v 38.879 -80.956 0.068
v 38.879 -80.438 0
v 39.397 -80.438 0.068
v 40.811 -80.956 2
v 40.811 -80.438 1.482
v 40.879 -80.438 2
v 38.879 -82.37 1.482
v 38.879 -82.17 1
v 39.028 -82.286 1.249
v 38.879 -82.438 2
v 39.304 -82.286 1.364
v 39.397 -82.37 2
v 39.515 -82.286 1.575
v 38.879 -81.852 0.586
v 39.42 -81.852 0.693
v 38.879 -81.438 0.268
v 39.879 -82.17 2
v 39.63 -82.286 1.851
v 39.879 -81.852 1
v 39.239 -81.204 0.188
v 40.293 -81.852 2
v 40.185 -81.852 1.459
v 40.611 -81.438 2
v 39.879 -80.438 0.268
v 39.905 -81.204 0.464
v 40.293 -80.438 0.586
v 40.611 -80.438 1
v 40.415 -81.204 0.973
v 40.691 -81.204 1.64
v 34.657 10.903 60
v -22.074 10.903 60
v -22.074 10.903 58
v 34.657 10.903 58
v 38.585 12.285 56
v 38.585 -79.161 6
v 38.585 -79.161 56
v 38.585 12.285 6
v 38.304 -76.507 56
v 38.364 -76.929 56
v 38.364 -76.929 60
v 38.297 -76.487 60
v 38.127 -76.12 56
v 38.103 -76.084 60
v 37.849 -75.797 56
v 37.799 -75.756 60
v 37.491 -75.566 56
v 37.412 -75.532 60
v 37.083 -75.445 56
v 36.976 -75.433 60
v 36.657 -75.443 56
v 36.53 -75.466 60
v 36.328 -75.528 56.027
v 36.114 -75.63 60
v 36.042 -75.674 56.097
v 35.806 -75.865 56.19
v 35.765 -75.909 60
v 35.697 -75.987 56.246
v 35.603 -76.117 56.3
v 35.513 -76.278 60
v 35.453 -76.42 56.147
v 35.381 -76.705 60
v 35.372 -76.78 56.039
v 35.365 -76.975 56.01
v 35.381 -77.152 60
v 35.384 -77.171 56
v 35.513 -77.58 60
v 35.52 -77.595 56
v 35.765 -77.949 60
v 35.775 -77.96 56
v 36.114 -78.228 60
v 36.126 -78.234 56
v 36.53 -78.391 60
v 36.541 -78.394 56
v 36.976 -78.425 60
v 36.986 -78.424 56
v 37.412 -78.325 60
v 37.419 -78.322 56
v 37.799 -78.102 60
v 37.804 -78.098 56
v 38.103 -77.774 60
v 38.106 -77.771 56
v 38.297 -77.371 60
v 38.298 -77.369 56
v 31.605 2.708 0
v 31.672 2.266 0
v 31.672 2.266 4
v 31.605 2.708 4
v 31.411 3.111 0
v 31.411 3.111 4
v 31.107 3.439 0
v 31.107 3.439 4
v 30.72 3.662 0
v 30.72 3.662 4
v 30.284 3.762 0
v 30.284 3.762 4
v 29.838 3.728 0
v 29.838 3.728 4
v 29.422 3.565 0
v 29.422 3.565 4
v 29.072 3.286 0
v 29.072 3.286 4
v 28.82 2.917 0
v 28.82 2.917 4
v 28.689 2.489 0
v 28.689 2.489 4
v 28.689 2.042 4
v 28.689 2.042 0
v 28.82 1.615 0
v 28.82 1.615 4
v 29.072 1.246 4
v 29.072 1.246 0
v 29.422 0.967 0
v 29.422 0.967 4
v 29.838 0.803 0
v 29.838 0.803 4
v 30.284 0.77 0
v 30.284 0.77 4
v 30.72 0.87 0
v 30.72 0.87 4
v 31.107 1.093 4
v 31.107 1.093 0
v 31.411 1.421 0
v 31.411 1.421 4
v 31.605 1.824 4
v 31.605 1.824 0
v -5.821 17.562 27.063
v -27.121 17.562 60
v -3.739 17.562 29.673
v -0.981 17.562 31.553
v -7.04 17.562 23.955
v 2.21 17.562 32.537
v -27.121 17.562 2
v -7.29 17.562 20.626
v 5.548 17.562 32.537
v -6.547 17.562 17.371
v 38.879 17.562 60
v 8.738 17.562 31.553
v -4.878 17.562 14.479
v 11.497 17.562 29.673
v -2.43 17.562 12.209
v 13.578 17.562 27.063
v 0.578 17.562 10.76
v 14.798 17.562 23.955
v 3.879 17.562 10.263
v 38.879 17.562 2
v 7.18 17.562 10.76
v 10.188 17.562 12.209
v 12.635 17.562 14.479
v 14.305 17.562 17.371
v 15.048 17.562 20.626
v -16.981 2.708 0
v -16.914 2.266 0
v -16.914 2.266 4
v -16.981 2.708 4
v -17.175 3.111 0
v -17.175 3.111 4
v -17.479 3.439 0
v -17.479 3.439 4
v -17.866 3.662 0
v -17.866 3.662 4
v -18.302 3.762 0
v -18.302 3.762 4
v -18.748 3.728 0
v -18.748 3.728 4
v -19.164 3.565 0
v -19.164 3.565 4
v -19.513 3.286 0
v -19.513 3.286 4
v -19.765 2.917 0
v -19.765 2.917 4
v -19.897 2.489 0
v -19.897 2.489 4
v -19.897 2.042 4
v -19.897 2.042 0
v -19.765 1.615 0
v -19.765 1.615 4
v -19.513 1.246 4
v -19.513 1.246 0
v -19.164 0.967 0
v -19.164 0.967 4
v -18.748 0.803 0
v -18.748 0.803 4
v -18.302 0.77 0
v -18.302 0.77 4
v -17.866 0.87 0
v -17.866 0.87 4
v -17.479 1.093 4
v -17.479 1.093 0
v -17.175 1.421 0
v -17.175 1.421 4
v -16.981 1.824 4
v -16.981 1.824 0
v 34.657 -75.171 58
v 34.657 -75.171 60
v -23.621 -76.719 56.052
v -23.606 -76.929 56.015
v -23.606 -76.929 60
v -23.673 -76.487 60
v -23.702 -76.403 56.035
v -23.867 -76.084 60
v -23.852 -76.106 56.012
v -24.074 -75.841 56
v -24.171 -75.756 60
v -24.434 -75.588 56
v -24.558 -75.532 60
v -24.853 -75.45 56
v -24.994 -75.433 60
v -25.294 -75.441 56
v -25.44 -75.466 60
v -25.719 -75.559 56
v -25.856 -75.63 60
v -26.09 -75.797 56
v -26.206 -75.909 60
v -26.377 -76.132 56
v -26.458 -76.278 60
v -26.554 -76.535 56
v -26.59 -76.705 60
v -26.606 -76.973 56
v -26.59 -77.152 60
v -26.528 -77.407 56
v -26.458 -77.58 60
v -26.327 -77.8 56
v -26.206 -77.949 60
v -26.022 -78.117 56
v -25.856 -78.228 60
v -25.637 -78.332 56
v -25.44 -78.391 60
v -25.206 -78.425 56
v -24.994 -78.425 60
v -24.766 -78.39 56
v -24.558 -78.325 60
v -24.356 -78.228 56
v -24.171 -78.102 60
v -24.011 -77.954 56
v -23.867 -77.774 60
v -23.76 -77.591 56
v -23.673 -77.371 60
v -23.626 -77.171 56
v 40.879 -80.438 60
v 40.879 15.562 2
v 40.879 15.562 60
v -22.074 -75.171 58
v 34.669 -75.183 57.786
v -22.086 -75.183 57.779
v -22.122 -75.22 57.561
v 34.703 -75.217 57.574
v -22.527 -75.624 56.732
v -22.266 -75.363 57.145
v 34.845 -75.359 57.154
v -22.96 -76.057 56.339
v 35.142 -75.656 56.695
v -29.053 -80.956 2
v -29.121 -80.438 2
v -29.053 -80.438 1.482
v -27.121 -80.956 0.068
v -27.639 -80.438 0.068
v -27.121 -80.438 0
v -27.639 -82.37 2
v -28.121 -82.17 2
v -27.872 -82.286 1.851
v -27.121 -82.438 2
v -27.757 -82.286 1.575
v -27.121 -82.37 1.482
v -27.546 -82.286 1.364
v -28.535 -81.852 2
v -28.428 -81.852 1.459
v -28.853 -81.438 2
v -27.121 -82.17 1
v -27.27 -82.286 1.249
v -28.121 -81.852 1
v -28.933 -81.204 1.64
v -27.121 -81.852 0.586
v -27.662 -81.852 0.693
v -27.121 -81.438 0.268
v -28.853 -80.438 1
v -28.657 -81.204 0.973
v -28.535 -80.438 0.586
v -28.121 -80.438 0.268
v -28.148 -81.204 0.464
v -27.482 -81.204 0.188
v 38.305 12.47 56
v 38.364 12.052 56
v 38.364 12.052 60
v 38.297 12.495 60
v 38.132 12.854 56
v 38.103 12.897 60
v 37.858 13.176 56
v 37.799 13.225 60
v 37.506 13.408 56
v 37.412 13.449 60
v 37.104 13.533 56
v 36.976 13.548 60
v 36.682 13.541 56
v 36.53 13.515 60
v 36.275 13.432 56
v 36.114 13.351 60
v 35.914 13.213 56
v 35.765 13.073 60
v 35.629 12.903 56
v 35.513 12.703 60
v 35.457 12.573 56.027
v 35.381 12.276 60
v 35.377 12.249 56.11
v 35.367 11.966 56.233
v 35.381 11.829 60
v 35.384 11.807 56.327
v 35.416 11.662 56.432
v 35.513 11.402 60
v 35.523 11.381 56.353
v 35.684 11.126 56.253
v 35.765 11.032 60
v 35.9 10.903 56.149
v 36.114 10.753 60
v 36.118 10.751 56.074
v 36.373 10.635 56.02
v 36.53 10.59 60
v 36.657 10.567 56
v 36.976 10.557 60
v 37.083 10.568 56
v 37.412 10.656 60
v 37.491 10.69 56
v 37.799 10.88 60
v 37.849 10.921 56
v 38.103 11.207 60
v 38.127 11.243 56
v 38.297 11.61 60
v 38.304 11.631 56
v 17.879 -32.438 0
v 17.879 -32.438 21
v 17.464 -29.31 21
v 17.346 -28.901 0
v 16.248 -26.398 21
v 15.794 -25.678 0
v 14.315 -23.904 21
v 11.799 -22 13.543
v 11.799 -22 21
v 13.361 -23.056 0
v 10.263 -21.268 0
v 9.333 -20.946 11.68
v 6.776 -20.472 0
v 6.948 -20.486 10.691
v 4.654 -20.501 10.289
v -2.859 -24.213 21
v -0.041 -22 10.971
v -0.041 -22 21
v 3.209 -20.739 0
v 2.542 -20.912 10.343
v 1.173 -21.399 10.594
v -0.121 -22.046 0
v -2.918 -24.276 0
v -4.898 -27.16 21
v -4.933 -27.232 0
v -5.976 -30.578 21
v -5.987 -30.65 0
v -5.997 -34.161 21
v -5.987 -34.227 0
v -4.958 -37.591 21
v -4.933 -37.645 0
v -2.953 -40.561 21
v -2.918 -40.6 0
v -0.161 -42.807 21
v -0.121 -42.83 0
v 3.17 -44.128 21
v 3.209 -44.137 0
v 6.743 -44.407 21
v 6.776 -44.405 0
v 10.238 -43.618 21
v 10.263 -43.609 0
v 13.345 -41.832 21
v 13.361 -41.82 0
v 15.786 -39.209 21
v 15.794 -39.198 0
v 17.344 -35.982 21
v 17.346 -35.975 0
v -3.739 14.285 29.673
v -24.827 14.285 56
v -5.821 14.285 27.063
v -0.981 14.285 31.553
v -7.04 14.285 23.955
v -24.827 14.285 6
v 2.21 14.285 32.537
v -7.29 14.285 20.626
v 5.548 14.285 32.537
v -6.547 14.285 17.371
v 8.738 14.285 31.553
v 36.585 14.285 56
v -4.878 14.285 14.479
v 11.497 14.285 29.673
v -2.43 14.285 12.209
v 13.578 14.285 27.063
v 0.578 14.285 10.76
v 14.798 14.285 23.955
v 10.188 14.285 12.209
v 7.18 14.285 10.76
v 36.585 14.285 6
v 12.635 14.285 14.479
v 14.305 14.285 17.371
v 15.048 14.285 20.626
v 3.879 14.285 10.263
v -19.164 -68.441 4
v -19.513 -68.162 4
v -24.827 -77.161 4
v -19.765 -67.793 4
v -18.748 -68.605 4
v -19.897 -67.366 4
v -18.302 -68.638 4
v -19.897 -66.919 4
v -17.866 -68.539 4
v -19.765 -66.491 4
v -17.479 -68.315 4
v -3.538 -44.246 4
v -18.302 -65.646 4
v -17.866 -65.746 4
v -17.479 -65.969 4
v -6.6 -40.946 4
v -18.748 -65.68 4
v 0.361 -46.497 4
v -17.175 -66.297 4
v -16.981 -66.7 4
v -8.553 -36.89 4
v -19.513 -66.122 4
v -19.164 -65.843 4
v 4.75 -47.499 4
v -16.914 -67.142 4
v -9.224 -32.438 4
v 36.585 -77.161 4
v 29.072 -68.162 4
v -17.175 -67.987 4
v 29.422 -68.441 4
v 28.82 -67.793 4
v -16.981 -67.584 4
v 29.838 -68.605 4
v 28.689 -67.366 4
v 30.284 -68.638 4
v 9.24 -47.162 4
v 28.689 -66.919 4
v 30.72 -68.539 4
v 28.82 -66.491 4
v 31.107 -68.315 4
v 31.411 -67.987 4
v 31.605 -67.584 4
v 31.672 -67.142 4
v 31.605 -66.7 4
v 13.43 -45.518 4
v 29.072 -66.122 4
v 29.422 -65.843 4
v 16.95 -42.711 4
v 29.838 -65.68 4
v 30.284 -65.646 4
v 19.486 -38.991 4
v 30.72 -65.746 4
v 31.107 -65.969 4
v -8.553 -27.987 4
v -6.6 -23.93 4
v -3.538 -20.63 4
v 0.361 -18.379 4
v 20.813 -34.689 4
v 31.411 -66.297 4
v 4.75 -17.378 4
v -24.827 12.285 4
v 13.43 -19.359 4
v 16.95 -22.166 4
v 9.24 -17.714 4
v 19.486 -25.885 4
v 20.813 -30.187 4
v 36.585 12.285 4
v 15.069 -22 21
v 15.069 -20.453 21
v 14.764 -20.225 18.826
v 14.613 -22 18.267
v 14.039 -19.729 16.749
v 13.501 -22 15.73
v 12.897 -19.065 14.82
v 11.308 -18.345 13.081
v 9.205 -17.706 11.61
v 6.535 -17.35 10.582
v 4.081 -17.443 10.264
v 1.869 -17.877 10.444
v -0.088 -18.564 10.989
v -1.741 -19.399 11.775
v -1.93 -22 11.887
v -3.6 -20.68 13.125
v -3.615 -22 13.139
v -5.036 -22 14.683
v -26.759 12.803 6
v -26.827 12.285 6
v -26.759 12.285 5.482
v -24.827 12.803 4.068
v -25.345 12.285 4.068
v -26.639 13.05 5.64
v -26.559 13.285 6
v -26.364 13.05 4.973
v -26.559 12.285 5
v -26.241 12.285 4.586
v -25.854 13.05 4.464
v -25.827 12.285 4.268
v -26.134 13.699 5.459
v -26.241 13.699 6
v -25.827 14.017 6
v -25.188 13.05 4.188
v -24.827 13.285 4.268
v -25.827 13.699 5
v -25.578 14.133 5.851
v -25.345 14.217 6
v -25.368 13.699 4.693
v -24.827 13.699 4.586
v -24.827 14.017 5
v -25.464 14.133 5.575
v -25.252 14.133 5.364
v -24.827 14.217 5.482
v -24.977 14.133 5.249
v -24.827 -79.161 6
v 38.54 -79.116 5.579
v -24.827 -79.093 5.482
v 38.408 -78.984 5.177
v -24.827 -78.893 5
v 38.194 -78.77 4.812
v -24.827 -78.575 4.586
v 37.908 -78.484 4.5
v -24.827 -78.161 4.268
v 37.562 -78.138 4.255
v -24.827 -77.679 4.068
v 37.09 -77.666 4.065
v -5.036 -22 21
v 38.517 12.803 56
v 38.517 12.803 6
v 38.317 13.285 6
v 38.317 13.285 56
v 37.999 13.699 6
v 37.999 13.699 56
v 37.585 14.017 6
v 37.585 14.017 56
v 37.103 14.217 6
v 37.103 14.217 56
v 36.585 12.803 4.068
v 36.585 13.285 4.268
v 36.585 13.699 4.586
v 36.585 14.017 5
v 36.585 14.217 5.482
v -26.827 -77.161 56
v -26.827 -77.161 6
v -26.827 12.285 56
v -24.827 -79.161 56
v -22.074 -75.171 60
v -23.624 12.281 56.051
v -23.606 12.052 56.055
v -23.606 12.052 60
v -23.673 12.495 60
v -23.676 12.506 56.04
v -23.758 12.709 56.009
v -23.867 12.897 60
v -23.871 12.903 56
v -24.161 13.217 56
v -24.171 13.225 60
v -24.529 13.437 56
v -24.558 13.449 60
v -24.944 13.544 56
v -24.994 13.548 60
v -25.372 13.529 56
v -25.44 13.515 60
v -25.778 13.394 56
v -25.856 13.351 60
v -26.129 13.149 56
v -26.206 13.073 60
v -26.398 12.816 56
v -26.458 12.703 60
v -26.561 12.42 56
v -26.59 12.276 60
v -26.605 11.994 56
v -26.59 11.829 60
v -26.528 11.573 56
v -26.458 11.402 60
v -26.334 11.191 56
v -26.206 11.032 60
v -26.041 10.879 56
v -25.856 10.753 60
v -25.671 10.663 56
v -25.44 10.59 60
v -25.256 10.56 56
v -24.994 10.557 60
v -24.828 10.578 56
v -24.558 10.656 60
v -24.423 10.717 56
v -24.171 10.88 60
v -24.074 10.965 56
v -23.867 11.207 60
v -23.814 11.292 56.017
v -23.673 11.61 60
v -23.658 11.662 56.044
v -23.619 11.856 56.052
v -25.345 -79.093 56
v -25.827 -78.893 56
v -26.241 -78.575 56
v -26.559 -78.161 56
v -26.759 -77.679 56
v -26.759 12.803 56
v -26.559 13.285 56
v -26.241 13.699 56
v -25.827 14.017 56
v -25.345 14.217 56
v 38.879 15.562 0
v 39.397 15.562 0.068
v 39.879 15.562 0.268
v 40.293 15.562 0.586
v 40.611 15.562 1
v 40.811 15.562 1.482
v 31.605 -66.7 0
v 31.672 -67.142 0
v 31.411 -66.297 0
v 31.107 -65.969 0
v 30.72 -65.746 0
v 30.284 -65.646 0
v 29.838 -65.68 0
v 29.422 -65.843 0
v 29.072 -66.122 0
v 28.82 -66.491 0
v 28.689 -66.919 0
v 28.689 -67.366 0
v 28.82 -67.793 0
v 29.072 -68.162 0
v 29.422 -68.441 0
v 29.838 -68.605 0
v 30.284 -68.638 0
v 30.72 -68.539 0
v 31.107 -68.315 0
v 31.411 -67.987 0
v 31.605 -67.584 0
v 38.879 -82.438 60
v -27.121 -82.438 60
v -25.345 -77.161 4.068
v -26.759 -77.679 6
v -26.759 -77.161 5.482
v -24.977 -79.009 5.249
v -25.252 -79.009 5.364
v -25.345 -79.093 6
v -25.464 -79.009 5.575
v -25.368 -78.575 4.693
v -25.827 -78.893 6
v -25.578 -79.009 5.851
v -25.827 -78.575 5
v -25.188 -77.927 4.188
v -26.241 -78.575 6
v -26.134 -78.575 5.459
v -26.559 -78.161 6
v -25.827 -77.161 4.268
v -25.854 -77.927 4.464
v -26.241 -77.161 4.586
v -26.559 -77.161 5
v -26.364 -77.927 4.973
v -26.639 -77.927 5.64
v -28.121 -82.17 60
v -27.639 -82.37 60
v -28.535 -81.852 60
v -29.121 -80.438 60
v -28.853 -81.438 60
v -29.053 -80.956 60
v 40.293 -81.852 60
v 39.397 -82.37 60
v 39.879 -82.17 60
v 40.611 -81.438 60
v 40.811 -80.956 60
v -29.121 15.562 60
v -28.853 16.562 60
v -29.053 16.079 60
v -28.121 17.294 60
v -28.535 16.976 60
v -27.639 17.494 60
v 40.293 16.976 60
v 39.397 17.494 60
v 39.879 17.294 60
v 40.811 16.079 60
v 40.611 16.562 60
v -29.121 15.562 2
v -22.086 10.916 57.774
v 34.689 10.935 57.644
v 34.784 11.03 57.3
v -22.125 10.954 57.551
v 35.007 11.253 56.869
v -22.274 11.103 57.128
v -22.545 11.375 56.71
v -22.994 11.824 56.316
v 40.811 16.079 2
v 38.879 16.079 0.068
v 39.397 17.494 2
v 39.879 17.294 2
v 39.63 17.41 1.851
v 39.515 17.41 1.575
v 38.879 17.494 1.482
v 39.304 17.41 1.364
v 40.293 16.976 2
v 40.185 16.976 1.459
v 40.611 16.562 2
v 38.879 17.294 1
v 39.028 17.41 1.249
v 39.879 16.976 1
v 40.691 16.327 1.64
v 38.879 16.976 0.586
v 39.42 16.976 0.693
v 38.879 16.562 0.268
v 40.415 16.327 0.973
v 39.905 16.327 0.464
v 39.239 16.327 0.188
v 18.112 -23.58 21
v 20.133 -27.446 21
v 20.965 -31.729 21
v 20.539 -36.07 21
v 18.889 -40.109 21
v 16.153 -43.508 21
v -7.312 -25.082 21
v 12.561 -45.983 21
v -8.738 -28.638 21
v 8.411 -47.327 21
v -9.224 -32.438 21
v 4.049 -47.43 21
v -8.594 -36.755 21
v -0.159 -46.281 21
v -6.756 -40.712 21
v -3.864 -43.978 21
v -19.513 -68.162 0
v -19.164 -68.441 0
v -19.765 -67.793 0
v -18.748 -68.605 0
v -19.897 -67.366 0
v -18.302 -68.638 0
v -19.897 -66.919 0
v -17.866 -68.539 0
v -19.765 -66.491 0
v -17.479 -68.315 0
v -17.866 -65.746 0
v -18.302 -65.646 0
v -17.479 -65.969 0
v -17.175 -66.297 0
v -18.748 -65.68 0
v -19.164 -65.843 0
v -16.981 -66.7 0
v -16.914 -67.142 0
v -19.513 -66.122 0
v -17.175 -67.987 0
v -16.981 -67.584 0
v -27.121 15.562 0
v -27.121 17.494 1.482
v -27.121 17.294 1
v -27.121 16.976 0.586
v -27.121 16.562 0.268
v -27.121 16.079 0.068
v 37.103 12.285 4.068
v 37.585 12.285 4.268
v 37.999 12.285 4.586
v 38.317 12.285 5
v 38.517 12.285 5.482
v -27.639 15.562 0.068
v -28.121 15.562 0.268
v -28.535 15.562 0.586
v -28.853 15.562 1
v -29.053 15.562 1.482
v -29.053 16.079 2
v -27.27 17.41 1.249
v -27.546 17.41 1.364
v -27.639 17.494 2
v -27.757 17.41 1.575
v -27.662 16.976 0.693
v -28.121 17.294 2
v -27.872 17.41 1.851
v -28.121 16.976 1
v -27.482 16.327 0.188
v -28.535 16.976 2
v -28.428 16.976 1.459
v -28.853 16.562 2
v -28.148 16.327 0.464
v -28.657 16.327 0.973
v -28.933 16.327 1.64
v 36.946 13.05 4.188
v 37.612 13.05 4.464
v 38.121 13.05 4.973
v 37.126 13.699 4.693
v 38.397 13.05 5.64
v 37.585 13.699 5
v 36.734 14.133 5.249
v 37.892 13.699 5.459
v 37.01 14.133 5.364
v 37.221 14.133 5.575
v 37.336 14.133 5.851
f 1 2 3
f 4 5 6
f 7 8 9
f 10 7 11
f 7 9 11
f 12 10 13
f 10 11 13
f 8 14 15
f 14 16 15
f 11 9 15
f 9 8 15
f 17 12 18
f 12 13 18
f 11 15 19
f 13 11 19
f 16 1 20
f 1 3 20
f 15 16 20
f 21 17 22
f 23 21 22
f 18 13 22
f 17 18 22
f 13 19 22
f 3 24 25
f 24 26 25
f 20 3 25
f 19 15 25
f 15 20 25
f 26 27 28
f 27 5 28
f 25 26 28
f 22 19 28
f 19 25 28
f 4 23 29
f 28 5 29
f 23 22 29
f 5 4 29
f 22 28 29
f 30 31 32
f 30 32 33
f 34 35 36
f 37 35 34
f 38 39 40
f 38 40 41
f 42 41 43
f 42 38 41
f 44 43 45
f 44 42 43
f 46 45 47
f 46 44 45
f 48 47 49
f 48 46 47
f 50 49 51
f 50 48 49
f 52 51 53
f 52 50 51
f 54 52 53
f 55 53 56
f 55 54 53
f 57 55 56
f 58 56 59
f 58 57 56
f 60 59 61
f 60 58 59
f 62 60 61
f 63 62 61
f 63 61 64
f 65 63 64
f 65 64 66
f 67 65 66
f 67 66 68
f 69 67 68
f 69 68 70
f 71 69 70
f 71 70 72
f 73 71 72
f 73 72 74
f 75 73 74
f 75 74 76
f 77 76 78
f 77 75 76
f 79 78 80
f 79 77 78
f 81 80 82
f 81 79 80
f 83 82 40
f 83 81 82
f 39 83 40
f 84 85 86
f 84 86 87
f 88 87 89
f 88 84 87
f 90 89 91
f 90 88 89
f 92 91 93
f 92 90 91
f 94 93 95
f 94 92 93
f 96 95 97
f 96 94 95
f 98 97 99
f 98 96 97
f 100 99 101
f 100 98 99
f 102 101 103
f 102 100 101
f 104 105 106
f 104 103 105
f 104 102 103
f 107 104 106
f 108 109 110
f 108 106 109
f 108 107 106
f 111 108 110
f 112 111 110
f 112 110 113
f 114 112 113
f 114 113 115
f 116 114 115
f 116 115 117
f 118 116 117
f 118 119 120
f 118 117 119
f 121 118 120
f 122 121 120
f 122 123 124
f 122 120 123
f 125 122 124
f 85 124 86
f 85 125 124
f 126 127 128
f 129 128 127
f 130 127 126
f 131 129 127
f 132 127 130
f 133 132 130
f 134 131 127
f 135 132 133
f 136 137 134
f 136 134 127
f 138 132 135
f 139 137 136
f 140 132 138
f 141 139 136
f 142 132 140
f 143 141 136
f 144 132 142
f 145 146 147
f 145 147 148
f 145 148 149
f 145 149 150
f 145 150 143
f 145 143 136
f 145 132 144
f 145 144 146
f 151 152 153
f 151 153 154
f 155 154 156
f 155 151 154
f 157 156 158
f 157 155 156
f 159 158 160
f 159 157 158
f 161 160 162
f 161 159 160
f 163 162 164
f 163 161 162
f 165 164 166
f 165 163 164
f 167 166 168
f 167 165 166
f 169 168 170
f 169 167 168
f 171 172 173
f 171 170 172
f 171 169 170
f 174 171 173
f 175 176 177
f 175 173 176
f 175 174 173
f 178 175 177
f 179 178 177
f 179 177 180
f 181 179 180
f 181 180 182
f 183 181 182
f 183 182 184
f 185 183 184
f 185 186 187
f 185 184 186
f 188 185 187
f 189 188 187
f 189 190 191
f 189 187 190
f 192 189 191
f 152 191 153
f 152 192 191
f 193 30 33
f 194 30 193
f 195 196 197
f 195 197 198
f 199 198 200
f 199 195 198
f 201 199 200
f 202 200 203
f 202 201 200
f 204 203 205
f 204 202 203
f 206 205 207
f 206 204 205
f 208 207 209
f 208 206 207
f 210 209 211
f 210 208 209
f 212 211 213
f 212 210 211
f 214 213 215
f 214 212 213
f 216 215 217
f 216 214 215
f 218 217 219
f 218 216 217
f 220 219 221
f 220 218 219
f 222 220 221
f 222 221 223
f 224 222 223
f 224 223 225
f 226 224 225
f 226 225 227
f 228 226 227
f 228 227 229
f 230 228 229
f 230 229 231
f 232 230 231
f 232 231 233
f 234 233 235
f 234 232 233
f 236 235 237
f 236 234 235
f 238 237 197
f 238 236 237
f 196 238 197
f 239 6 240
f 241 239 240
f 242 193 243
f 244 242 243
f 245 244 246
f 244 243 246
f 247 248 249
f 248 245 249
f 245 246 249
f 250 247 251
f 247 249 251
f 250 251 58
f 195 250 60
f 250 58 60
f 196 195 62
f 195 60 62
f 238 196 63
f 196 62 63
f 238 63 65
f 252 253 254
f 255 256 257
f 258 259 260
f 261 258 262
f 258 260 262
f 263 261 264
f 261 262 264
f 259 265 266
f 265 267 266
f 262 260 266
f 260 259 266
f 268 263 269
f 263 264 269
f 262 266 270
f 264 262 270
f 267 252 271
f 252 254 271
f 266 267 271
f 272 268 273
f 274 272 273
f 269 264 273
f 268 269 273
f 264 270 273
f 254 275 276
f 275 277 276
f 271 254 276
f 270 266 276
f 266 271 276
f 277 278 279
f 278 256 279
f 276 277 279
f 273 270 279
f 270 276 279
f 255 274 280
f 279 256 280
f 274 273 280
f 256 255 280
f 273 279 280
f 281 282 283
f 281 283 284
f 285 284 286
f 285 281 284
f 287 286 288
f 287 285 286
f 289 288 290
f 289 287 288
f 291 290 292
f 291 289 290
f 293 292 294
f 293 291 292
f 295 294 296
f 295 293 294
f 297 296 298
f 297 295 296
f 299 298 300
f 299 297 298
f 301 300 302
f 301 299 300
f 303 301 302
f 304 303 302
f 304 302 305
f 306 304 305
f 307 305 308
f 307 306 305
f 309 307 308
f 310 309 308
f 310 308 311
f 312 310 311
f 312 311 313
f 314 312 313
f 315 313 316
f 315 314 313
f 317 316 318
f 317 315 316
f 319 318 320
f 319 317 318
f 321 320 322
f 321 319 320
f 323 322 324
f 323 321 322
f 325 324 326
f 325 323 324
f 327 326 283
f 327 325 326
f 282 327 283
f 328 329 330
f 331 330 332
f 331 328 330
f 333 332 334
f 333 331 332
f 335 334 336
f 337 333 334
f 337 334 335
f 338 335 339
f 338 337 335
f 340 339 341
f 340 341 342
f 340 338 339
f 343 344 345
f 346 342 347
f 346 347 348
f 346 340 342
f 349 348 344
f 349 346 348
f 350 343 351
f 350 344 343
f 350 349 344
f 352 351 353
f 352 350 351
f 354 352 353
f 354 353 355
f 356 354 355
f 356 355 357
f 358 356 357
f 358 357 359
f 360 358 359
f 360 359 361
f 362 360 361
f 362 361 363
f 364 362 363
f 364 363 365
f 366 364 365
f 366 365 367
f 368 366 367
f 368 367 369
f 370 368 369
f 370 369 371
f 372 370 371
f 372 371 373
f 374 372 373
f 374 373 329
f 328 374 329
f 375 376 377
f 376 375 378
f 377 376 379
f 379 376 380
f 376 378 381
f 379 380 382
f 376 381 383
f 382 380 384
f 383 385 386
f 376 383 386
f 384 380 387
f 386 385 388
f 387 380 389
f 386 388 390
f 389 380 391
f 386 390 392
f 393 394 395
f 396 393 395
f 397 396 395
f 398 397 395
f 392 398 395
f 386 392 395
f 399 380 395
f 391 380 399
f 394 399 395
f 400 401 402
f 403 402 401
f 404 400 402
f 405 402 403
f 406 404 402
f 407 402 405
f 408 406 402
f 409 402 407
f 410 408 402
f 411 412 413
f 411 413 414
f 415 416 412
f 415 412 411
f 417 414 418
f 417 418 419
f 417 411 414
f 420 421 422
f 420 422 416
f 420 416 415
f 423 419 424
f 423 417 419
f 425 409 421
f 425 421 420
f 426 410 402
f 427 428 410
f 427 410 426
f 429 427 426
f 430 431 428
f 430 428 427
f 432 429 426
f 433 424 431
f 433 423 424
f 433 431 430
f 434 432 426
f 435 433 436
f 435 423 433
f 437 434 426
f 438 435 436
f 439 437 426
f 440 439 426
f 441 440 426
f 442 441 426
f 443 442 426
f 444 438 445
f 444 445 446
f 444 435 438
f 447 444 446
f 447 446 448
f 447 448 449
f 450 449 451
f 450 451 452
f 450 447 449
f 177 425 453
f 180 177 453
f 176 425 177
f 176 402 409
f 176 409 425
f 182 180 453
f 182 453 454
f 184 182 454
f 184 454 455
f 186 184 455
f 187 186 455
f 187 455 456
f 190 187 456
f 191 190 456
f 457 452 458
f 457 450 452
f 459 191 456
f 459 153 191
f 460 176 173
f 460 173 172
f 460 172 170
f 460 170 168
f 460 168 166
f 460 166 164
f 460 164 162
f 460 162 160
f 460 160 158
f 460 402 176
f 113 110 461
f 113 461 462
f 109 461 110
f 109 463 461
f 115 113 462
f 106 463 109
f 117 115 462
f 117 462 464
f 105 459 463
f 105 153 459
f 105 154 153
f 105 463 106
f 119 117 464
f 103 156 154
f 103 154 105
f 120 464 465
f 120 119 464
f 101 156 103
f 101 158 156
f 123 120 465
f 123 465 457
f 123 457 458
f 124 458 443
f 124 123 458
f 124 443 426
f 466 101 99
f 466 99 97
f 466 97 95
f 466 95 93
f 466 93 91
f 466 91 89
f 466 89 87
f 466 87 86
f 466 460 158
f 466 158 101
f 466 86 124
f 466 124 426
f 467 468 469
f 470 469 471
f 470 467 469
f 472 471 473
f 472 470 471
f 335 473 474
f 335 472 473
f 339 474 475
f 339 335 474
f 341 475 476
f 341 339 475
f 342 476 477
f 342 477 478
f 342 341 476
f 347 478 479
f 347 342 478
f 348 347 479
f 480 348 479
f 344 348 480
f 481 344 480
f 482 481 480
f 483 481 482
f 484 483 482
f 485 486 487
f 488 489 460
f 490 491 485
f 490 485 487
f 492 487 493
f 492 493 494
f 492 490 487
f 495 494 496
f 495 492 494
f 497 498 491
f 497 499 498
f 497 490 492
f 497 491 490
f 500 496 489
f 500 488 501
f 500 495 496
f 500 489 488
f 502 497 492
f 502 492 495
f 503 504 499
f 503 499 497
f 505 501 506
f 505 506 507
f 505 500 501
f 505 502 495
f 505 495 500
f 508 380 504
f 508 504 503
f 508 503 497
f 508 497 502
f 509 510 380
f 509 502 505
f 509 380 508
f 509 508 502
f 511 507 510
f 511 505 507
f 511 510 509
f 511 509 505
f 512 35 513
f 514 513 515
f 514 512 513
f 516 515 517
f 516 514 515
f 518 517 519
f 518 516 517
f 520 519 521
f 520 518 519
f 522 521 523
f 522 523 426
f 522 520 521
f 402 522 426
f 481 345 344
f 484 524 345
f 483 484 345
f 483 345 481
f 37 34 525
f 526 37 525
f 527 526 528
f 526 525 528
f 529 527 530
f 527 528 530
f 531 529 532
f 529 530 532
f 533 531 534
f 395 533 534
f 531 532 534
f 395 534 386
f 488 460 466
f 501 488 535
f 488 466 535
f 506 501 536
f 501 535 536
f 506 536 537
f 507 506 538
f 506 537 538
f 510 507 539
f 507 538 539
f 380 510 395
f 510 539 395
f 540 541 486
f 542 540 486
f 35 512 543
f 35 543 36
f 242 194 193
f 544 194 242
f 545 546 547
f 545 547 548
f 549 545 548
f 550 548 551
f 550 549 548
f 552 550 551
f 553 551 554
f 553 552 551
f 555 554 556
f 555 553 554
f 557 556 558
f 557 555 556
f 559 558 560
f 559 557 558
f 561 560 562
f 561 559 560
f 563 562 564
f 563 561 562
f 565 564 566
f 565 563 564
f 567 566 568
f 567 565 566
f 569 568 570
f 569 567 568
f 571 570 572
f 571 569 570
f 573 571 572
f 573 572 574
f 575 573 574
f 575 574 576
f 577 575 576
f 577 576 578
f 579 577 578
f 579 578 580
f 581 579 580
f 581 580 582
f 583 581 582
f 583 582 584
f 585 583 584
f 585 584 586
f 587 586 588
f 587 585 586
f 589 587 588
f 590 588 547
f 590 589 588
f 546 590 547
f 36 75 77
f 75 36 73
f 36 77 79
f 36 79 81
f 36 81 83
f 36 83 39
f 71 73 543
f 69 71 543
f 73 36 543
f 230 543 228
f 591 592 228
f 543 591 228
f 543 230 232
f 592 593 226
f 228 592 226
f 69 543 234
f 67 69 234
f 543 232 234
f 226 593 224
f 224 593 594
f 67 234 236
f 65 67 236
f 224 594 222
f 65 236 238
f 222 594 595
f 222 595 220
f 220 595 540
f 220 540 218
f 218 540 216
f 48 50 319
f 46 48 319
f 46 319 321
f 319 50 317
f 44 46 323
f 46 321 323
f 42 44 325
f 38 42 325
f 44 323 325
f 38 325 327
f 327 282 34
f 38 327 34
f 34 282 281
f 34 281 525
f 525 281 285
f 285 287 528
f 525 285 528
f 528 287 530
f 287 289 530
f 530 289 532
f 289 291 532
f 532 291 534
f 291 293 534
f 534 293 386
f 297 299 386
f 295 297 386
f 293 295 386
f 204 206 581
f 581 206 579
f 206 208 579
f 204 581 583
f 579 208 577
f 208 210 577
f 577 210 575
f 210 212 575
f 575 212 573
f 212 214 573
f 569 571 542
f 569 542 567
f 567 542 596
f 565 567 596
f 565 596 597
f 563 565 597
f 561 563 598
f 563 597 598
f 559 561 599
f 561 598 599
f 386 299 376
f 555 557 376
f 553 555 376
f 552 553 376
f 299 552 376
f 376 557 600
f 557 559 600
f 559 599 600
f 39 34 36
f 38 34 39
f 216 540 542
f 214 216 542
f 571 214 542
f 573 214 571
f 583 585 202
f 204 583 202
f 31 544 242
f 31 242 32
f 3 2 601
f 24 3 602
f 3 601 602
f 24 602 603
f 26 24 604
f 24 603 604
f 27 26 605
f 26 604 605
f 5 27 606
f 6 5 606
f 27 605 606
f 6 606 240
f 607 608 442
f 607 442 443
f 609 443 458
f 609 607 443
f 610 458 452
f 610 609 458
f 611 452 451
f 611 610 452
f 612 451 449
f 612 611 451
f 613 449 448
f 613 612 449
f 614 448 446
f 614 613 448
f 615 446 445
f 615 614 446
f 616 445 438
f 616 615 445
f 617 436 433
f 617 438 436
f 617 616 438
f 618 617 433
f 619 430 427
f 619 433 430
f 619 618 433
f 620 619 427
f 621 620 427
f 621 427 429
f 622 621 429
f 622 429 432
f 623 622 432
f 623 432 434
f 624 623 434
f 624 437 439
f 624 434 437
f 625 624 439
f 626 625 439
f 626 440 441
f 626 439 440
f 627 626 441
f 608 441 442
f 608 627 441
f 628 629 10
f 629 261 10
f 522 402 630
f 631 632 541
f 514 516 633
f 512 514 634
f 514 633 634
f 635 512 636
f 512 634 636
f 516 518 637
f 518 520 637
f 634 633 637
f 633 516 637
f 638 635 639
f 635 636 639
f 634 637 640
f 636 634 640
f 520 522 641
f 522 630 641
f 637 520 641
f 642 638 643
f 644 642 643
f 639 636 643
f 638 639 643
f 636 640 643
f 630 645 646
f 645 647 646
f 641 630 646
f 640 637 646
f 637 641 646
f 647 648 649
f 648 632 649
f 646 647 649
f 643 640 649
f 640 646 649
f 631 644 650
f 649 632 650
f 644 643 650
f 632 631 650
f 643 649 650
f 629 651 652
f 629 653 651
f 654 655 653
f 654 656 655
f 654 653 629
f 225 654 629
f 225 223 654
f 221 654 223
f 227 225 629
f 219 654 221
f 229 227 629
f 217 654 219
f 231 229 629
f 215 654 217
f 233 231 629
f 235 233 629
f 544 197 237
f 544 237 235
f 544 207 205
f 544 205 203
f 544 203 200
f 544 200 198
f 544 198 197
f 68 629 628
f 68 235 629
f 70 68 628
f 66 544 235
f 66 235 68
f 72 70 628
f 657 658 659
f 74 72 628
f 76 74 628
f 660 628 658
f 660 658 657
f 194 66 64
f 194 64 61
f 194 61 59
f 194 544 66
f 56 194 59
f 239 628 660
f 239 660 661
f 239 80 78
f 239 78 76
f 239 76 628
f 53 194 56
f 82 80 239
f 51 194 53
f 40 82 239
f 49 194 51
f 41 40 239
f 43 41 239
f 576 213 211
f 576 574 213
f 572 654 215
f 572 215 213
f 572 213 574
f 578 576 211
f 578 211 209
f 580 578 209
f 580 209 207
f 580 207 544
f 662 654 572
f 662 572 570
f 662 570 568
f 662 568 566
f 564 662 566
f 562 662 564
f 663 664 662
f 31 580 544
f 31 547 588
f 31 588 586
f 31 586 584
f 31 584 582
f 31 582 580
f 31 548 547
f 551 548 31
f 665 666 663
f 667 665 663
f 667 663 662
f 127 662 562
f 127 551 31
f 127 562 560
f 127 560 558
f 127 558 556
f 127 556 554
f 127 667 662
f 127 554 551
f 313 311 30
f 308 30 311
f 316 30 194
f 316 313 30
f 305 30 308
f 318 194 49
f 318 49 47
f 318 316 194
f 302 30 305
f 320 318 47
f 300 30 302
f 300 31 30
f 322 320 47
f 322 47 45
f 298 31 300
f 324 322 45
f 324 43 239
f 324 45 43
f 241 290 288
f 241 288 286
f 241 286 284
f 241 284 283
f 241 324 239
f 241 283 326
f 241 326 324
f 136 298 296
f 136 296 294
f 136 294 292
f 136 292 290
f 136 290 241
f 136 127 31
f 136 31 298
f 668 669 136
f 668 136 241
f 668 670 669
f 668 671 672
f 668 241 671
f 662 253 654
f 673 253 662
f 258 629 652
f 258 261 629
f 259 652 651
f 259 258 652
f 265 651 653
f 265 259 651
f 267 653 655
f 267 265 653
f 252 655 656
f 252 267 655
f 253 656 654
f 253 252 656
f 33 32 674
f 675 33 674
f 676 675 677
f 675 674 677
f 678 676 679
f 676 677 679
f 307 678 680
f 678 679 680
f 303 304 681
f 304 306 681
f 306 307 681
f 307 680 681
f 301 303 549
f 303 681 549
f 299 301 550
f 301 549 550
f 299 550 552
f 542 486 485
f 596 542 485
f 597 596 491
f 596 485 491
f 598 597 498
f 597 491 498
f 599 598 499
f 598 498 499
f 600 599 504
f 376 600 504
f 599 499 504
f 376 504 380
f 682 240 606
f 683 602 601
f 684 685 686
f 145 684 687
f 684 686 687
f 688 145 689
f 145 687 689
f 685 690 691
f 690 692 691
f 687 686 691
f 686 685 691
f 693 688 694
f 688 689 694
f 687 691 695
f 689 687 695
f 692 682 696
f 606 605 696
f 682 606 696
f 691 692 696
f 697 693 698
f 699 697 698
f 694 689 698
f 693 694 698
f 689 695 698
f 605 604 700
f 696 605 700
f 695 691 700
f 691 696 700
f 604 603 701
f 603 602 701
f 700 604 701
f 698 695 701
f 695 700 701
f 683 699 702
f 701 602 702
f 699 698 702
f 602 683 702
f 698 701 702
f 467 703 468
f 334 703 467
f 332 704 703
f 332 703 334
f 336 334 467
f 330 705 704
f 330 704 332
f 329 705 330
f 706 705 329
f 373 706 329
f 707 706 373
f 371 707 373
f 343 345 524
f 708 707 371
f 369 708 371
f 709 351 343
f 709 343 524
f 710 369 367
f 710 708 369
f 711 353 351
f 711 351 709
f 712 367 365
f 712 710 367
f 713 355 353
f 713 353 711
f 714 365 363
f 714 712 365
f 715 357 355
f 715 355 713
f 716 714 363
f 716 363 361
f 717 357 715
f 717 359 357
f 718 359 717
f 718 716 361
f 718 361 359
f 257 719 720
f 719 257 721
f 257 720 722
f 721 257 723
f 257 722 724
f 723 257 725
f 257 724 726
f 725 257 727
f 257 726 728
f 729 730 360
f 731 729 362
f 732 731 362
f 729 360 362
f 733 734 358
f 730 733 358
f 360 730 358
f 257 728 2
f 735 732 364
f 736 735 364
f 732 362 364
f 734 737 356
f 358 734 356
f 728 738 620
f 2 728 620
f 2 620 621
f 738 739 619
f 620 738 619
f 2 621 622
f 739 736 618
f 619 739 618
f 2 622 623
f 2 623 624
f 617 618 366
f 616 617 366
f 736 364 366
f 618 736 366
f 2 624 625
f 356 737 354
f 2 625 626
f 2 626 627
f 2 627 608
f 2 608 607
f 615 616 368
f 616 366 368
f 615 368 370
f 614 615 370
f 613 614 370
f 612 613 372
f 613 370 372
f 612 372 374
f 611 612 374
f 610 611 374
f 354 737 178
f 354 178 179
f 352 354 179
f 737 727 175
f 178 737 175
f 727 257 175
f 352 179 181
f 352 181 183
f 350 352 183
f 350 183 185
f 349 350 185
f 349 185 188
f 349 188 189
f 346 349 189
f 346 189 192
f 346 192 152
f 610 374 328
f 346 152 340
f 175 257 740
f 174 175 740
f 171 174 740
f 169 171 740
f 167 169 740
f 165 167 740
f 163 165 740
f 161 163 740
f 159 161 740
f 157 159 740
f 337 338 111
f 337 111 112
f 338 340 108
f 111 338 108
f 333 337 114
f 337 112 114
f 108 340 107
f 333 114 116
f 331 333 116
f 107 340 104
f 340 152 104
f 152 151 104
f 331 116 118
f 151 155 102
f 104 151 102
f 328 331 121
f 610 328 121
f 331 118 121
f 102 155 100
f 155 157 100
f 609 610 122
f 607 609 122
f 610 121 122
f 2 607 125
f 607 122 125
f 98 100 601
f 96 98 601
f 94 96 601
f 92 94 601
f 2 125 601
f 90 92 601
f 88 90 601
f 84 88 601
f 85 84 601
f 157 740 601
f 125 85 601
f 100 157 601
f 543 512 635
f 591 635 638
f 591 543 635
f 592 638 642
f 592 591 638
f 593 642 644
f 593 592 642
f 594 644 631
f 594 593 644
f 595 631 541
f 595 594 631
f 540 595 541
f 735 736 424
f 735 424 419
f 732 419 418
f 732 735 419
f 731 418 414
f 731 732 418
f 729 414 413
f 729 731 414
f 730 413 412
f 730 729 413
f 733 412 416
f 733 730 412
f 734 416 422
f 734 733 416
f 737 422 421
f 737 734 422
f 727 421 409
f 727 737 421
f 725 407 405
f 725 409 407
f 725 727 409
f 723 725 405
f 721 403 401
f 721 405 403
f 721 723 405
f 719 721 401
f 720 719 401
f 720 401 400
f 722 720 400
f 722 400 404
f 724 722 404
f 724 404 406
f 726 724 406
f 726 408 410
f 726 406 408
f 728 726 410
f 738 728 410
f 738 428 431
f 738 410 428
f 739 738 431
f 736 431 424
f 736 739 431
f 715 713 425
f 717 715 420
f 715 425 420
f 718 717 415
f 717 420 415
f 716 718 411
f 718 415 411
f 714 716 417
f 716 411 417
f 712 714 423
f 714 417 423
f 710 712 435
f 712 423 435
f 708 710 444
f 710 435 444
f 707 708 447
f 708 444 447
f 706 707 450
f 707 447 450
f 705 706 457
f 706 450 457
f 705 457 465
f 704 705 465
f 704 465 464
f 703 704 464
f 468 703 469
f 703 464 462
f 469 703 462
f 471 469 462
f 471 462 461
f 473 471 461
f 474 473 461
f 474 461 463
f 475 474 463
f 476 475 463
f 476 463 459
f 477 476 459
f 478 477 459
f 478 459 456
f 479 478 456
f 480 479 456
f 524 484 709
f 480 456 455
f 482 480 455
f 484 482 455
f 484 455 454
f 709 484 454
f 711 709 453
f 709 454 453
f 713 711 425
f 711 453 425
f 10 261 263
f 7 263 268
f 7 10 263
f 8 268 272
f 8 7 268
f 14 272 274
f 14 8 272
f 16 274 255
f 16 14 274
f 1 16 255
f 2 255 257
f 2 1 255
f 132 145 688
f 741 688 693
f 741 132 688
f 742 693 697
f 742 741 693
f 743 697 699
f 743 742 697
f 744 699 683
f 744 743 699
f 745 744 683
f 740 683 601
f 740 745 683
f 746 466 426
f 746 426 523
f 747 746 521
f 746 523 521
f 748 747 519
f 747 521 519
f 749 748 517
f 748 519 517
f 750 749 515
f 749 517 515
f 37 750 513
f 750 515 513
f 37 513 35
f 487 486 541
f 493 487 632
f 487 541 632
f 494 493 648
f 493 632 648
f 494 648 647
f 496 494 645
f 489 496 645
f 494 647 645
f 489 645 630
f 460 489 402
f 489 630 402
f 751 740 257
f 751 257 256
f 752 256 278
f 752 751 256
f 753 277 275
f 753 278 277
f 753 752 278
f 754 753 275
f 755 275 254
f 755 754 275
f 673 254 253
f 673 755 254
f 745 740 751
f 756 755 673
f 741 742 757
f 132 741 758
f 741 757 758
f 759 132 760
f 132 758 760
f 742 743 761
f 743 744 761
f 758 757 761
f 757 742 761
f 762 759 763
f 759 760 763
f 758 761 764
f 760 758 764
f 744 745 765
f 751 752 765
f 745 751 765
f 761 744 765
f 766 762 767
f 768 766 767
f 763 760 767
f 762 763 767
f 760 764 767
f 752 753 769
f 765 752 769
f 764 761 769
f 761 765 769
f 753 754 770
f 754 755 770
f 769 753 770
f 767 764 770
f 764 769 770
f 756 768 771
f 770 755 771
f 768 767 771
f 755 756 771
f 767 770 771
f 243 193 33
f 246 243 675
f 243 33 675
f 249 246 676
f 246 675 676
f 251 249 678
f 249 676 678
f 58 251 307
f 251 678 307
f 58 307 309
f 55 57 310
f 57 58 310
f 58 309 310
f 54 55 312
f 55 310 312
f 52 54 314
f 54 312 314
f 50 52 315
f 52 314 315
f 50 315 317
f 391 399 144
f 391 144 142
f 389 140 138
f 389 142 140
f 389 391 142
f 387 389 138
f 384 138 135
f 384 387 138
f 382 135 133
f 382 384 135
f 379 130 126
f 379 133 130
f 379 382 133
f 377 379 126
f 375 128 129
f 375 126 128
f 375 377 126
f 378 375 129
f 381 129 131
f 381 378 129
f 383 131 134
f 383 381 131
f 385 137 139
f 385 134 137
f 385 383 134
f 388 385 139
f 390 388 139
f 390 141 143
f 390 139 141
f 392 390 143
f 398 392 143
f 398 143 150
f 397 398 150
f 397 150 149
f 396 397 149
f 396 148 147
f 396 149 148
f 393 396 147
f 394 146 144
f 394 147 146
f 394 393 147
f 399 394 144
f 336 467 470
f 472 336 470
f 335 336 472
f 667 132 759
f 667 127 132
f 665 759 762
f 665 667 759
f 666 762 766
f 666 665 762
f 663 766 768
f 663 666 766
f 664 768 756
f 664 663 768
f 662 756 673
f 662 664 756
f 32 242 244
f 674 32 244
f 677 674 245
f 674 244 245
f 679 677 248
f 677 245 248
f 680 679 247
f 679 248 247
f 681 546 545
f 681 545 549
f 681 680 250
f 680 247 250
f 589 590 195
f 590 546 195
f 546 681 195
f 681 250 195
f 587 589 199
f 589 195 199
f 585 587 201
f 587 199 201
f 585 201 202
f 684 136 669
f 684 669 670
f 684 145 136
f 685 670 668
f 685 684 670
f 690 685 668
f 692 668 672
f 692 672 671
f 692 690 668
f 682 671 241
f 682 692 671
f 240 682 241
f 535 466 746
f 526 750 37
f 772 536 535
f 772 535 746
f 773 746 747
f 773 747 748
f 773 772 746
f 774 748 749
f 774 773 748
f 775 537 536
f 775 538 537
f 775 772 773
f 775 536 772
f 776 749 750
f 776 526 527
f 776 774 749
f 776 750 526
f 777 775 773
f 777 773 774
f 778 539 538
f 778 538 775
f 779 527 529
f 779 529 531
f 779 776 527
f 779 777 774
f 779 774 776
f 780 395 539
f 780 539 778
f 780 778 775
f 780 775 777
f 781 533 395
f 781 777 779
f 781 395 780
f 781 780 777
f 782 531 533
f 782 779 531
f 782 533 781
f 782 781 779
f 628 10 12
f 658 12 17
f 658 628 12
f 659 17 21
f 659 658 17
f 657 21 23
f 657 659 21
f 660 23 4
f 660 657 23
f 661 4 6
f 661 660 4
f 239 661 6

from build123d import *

# Parameters (mm, degrees)
ESBO_O1_W                   = 70
ESBO_O1_H                   = 100
ESBO_O1_R                   = 12
RESSALTO_EXTRUS_O1_DEPTH    = 4
ESBO_O2_R                   = 15.102889219
ESBO_O2_R_2                 = 12
RESSALTO_EXTRUS_O2_DEPTH    = 21
ESBO_O3_W                   = 70
ESBO_O3_H                   = 100
ESBO_O3_W_2                 = 65.412301245
ESBO_O3_H_2                 = 93.446144636
RESSALTO_EXTRUS_O3_DEPTH    = 60
FILETE1_R                   = 2
FILETE2_R                   = 2
FILETE3_R                   = 2
FILETE4_R                   = 2
FILETE5_R                   = 2
CORTE_EXTRUS_O1_DEPTH       = 17
CORTE_EXTRUS_O1_DEPTH_BACK  = 14
ESBO_O4_R                   = 1.5
FILETE6_R                   = 2
FILETE7_R                   = 2
RESSALTO_EXTRUS_O4_DEPTH    = 4
CORTE_EXTRUS_O2_DEPTH       = 4
CORTE_EXTRUS_O2_DEPTH_BACK  = 14
ESBO_O5_R                   = 1.5
FILETE8_R                   = 2
CORTE_EXTRUS_O10_DEPTH      = 32
CORTE_EXTRUS_O10_DEPTH_BACK = 22
ESBO_O6_R                   = 11.2


with BuildPart() as part:
    # Esboço1 → Ressalto-extrusão1 (new body)
    with BuildSketch(Plane.XY):
        with Locations((5.878926005, -32.438162544)):
            Rectangle(ESBO_O1_W, ESBO_O1_H)
        with Locations((5.878926005, -32.438162544)):
            Circle(ESBO_O1_R, mode=Mode.SUBTRACT)
    extrude(amount=RESSALTO_EXTRUS_O1_DEPTH)

    # Esboço2 → Ressalto-extrusão2 (add)
    with BuildSketch(Plane.XY):
        with Locations(Location((5.878926005, -32.438162544, 0), (0, 0, 180))):
            Circle(ESBO_O2_R)
        with Locations((5.878926005, -32.438162544)):
            Circle(ESBO_O2_R_2, mode=Mode.SUBTRACT)
    extrude(amount=RESSALTO_EXTRUS_O2_DEPTH)

    # Esboço3 → Ressalto-extrusão3 (add)
    with BuildSketch(Plane.XY):
        with Locations((5.878926005, -32.438162544)):
            Rectangle(ESBO_O3_W, ESBO_O3_H)
        with Locations((5.878926006, -32.438162544)):
            Rectangle(ESBO_O3_W_2, ESBO_O3_H_2, mode=Mode.SUBTRACT)
    extrude(amount=RESSALTO_EXTRUS_O3_DEPTH)

    # Filete1
    filete1_edges = [part.edges().sort_by_distance(p)[0] for p in [
        (-29.121073995, -32.438162544, 0),
    ]]
    fillet(filete1_edges, radius=FILETE1_R)

    # Filete2
    filete2_edges = [part.edges().sort_by_distance(p)[0] for p in [
        (40.878926005, -32.438162544, 0),
    ]]
    fillet(filete2_edges, radius=FILETE2_R)

    # Filete3
    filete3_edges = [part.edges().sort_by_distance(p)[0] for p in [
        (-26.827224617, -32.438162544, 4),
    ]]
    fillet(filete3_edges, radius=FILETE3_R)

    # Filete4
    filete4_edges = [part.edges().sort_by_distance(p)[0] for p in [
        (-26.827224617, -79.161234862, 33),
        (6.878926005, -79.161234862, 4),
        (38.585076628, -32.438162544, 4),
        (-26.24143818, -79.161234862, 4.585786438),
    ]]
    fillet(filete4_edges, radius=FILETE4_R)

    # Filete5
    filete5_edges = [part.edges().sort_by_distance(p)[0] for p in [
        (38.585076628, 14.284909774, 33),
        (-26.827224617, 14.284909774, 33),
        (5.878926005, 14.284909774, 4),
        (-26.24143818, 14.284909774, 4.585786438),
        (37.99929019, 14.284909774, 4.585786438),
    ]]
    fillet(filete5_edges, radius=FILETE5_R)

    # Esboço4 → Corte-extrusão1 (cut, two sides: drawn at the far end of the back side and taken through both)
    with BuildSketch(Plane.XY.offset(-CORTE_EXTRUS_O1_DEPTH_BACK)):
        with Locations((-18.413897623, 2.265871211)):
            Circle(ESBO_O4_R)
        with Locations((30.171749634, 2.265871211)):
            Circle(ESBO_O4_R)
        with Locations((30.171749634, -67.142196299)):
            Circle(ESBO_O4_R)
        with Locations((-18.413897623, -67.142196299)):
            Circle(ESBO_O4_R)
    extrude(amount=CORTE_EXTRUS_O1_DEPTH + CORTE_EXTRUS_O1_DEPTH_BACK, mode=Mode.SUBTRACT)

    # Filete6
    filete6_edges = [part.edges().sort_by_distance(p)[0] for p in [
        (-28.535287557, 17.561837456, 0.585786438),
        (5.878926005, 17.561837456, 0),
        (40.293139568, 17.561837456, 0.585786438),
        (-29.121073995, 17.561837456, 31),
        (40.878926005, 17.561837456, 31),
    ]]
    fillet(filete6_edges, radius=FILETE6_R)

    # Filete7
    filete7_edges = [part.edges().sort_by_distance(p)[0] for p in [
        (5.878926005, -82.438162544, 0),
        (-28.535287557, -82.438162544, 0.585786438),
        (40.293139568, -82.438162544, 0.585786438),
        (40.878926005, -82.438162544, 31),
        (-29.121073995, -82.438162544, 31),
    ]]
    fillet(filete7_edges, radius=FILETE7_R)

    # 3DSketch1 → Ressalto-extrusão4 (add)
    with BuildSketch(Plane(origin=(-26.827224617, -78.648847783, 60), x_dir=(0.5739296342961376, 0.81890461891279, 0), z_dir=(0, 0, 1))):
        Polygon((0, 0), (-1.957959753, -1.372236887), (36.074200136, -55.637968328), (115.460568304, 0), (77.428408415, 54.265731441), (77.149565293, 54.070304126), (75.833057159, 55.948747976), (-1.316508134, 1.87844385), align=None)
        Polygon((76.062739818, 47.503741973), (108.622178683, 1.046696924), (38.135627574, -48.353831008), (5.57618871, -1.896785959), align=None, mode=Mode.SUBTRACT)
    extrude(amount=-RESSALTO_EXTRUS_O4_DEPTH)

    # Esboço5 → Corte-extrusão2 (cut, two sides: drawn at the far end of the back side and taken through both)
    with BuildSketch(Plane.XY.offset(60).offset(-CORTE_EXTRUS_O2_DEPTH_BACK)):
        with Locations((-25.106275155, 12.052447262)):
            Circle(ESBO_O5_R)
        with Locations((36.864127165, -76.928772351)):
            Circle(ESBO_O5_R)
        with Locations((36.864127165, 12.052447262)):
            Circle(ESBO_O5_R)
        with Locations((-25.106275155, -76.928772351)):
            Circle(ESBO_O5_R)
    extrude(amount=CORTE_EXTRUS_O2_DEPTH + CORTE_EXTRUS_O2_DEPTH_BACK, mode=Mode.SUBTRACT)

    # Filete8
    # the kernel refuses this fillet: 2 mm, written as the material it takes off along each edge
    with BuildSketch(Plane(origin=(-22.073597887, 10.90308644, 56), x_dir=(0, 0, 1), z_dir=(1, 0, 0)), Plane(origin=(34.657117725, -75.171102764, 56), x_dir=(0, 0, 1), z_dir=(-1, 0, 0))) as filete8_piece_1:
        with BuildLine():
            CenterArc((FILETE8_R, -FILETE8_R), FILETE8_R, 90, 90)
            Line((0, -FILETE8_R), (-FILETE8_R * 0.02, -FILETE8_R))
            Line((-FILETE8_R * 0.02, -FILETE8_R), (-FILETE8_R * 0.02, FILETE8_R * 0.02))
            Line((-FILETE8_R * 0.02, FILETE8_R * 0.02), (FILETE8_R, FILETE8_R * 0.02))
            Line((FILETE8_R, FILETE8_R * 0.02), (FILETE8_R, 0))
        make_face()
    extrude(amount=56.730715612, mode=Mode.SUBTRACT)
    with BuildSketch(Plane(origin=(-22.073597887, -75.171102764, 56), x_dir=(0, 0, 1), z_dir=(0, 1, 0)), Plane(origin=(34.657117725, 10.90308644, 56), x_dir=(0, 0, 1), z_dir=(0, -1, 0))) as filete8_piece_2:
        with BuildLine():
            CenterArc((FILETE8_R, -FILETE8_R), FILETE8_R, 90, 90)
            Line((0, -FILETE8_R), (-FILETE8_R * 0.02, -FILETE8_R))
            Line((-FILETE8_R * 0.02, -FILETE8_R), (-FILETE8_R * 0.02, FILETE8_R * 0.02))
            Line((-FILETE8_R * 0.02, FILETE8_R * 0.02), (FILETE8_R, FILETE8_R * 0.02))
            Line((FILETE8_R, FILETE8_R * 0.02), (FILETE8_R, 0))
        make_face()
    extrude(amount=86.074189204, mode=Mode.SUBTRACT)
    with BuildSketch(Plane(origin=(-27.073597887, 10.90308644, 56), x_dir=(0, 0, 1), z_dir=(1, 0, 0))) as filete8_piece_3a_section:
        with BuildLine():
            CenterArc((FILETE8_R, -FILETE8_R), FILETE8_R, 90, 90)
            Line((0, -FILETE8_R), (-FILETE8_R * 0.02, -FILETE8_R))
            Line((-FILETE8_R * 0.02, -FILETE8_R), (-FILETE8_R * 0.02, FILETE8_R * 0.02))
            Line((-FILETE8_R * 0.02, FILETE8_R * 0.02), (FILETE8_R, FILETE8_R * 0.02))
            Line((FILETE8_R, FILETE8_R * 0.02), (FILETE8_R, 0))
        make_face()
    filete8_piece_3a = extrude(amount=61.730715612, mode=Mode.PRIVATE)
    filete8_piece_3a = split(filete8_piece_3a, bisect_by=Plane(origin=(-22.073597887, 11.355876668, 56.452790229), z_dir=(-1, 0, 0)), keep=Keep.TOP, mode=Mode.PRIVATE)
    with BuildSketch(Plane(origin=(-22.073597887, -75.171102764, 56), x_dir=(0, 0, 1), z_dir=(0, 1, 0))) as filete8_piece_3b_section:
        with BuildLine():
            CenterArc((FILETE8_R, -FILETE8_R), FILETE8_R, 90, 90)
            Line((0, -FILETE8_R), (-FILETE8_R * 0.02, -FILETE8_R))
            Line((-FILETE8_R * 0.02, -FILETE8_R), (-FILETE8_R * 0.02, FILETE8_R * 0.02))
            Line((-FILETE8_R * 0.02, FILETE8_R * 0.02), (FILETE8_R, FILETE8_R * 0.02))
            Line((FILETE8_R, FILETE8_R * 0.02), (FILETE8_R, 0))
        make_face()
    filete8_piece_3b = extrude(amount=91.074189204, mode=Mode.PRIVATE)
    filete8_piece_3b = split(filete8_piece_3b, bisect_by=Plane(origin=(-22.526388116, 10.90308644, 56.452790229), z_dir=(0, 1, 0)), keep=Keep.TOP, mode=Mode.PRIVATE)
    filete8_piece_3 = filete8_piece_3a & filete8_piece_3b
    add(filete8_piece_3, mode=Mode.SUBTRACT)
    with BuildSketch(Plane(origin=(34.657117725, 15.90308644, 56), x_dir=(0, 0, 1), z_dir=(0, -1, 0))) as filete8_piece_4a_section:
        with BuildLine():
            CenterArc((FILETE8_R, -FILETE8_R), FILETE8_R, 90, 90)
            Line((0, -FILETE8_R), (-FILETE8_R * 0.02, -FILETE8_R))
            Line((-FILETE8_R * 0.02, -FILETE8_R), (-FILETE8_R * 0.02, FILETE8_R * 0.02))
            Line((-FILETE8_R * 0.02, FILETE8_R * 0.02), (FILETE8_R, FILETE8_R * 0.02))
            Line((FILETE8_R, FILETE8_R * 0.02), (FILETE8_R, 0))
        make_face()
    filete8_piece_4a = extrude(amount=91.074189204, mode=Mode.PRIVATE)
    filete8_piece_4a = split(filete8_piece_4a, bisect_by=Plane(origin=(35.109907953, 10.90308644, 56.452790229), z_dir=(0, 1, 0)), keep=Keep.TOP, mode=Mode.PRIVATE)
    with BuildSketch(Plane(origin=(-22.073597887, 10.90308644, 56), x_dir=(0, 0, 1), z_dir=(1, 0, 0))) as filete8_piece_4b_section:
        with BuildLine():
            CenterArc((FILETE8_R, -FILETE8_R), FILETE8_R, 90, 90)
            Line((0, -FILETE8_R), (-FILETE8_R * 0.02, -FILETE8_R))
            Line((-FILETE8_R * 0.02, -FILETE8_R), (-FILETE8_R * 0.02, FILETE8_R * 0.02))
            Line((-FILETE8_R * 0.02, FILETE8_R * 0.02), (FILETE8_R, FILETE8_R * 0.02))
            Line((FILETE8_R, FILETE8_R * 0.02), (FILETE8_R, 0))
        make_face()
    filete8_piece_4b = extrude(amount=61.730715612, mode=Mode.PRIVATE)
    filete8_piece_4b = split(filete8_piece_4b, bisect_by=Plane(origin=(34.657117725, 11.355876668, 56.452790229), z_dir=(1, 0, 0)), keep=Keep.TOP, mode=Mode.PRIVATE)
    filete8_piece_4 = filete8_piece_4a & filete8_piece_4b
    add(filete8_piece_4, mode=Mode.SUBTRACT)
    with BuildSketch(Plane(origin=(34.657117725, -75.171102764, 56), x_dir=(0, 0, 1), z_dir=(-1, 0, 0))) as filete8_piece_5a_section:
        with BuildLine():
            CenterArc((FILETE8_R, -FILETE8_R), FILETE8_R, 90, 90)
            Line((0, -FILETE8_R), (-FILETE8_R * 0.02, -FILETE8_R))
            Line((-FILETE8_R * 0.02, -FILETE8_R), (-FILETE8_R * 0.02, FILETE8_R * 0.02))
            Line((-FILETE8_R * 0.02, FILETE8_R * 0.02), (FILETE8_R, FILETE8_R * 0.02))
            Line((FILETE8_R, FILETE8_R * 0.02), (FILETE8_R, 0))
        make_face()
    filete8_piece_5a = extrude(amount=61.730715612, mode=Mode.PRIVATE)
    filete8_piece_5a = split(filete8_piece_5a, bisect_by=Plane(origin=(-22.073597887, -75.623892993, 56.452790229), z_dir=(-1, 0, 0)), keep=Keep.TOP, mode=Mode.PRIVATE)
    with BuildSketch(Plane(origin=(-22.073597887, -80.171102764, 56), x_dir=(0, 0, 1), z_dir=(0, 1, 0))) as filete8_piece_5b_section:
        with BuildLine():
            CenterArc((FILETE8_R, -FILETE8_R), FILETE8_R, 90, 90)
            Line((0, -FILETE8_R), (-FILETE8_R * 0.02, -FILETE8_R))
            Line((-FILETE8_R * 0.02, -FILETE8_R), (-FILETE8_R * 0.02, FILETE8_R * 0.02))
            Line((-FILETE8_R * 0.02, FILETE8_R * 0.02), (FILETE8_R, FILETE8_R * 0.02))
            Line((FILETE8_R, FILETE8_R * 0.02), (FILETE8_R, 0))
        make_face()
    filete8_piece_5b = extrude(amount=91.074189204, mode=Mode.PRIVATE)
    filete8_piece_5b = split(filete8_piece_5b, bisect_by=Plane(origin=(-22.526388116, -75.171102764, 56.452790229), z_dir=(0, -1, 0)), keep=Keep.TOP, mode=Mode.PRIVATE)
    filete8_piece_5 = filete8_piece_5a & filete8_piece_5b
    add(filete8_piece_5, mode=Mode.SUBTRACT)
    with BuildSketch(Plane(origin=(34.657117725, 10.90308644, 56), x_dir=(0, 0, 1), z_dir=(0, -1, 0))) as filete8_piece_6a_section:
        with BuildLine():
            CenterArc((FILETE8_R, -FILETE8_R), FILETE8_R, 90, 90)
            Line((0, -FILETE8_R), (-FILETE8_R * 0.02, -FILETE8_R))
            Line((-FILETE8_R * 0.02, -FILETE8_R), (-FILETE8_R * 0.02, FILETE8_R * 0.02))
            Line((-FILETE8_R * 0.02, FILETE8_R * 0.02), (FILETE8_R, FILETE8_R * 0.02))
            Line((FILETE8_R, FILETE8_R * 0.02), (FILETE8_R, 0))
        make_face()
    filete8_piece_6a = extrude(amount=91.074189204, mode=Mode.PRIVATE)
    filete8_piece_6a = split(filete8_piece_6a, bisect_by=Plane(origin=(35.109907953, -75.171102764, 56.452790229), z_dir=(0, -1, 0)), keep=Keep.TOP, mode=Mode.PRIVATE)
    with BuildSketch(Plane(origin=(39.657117725, -75.171102764, 56), x_dir=(0, 0, 1), z_dir=(-1, 0, 0))) as filete8_piece_6b_section:
        with BuildLine():
            CenterArc((FILETE8_R, -FILETE8_R), FILETE8_R, 90, 90)
            Line((0, -FILETE8_R), (-FILETE8_R * 0.02, -FILETE8_R))
            Line((-FILETE8_R * 0.02, -FILETE8_R), (-FILETE8_R * 0.02, FILETE8_R * 0.02))
            Line((-FILETE8_R * 0.02, FILETE8_R * 0.02), (FILETE8_R, FILETE8_R * 0.02))
            Line((FILETE8_R, FILETE8_R * 0.02), (FILETE8_R, 0))
        make_face()
    filete8_piece_6b = extrude(amount=61.730715612, mode=Mode.PRIVATE)
    filete8_piece_6b = split(filete8_piece_6b, bisect_by=Plane(origin=(34.657117725, -75.623892993, 56.452790229), z_dir=(1, 0, 0)), keep=Keep.TOP, mode=Mode.PRIVATE)
    filete8_piece_6 = filete8_piece_6a & filete8_piece_6b
    add(filete8_piece_6, mode=Mode.SUBTRACT)

    # Esboço6 → Corte-extrusão10 (cut, two sides: drawn at the far end of the back side and taken through both)
    with BuildSketch(Plane(origin=(0, 0, 0), x_dir=(1, 0, 0), z_dir=(0, 1, 0)).offset(-CORTE_EXTRUS_O10_DEPTH_BACK)):
        with Locations(Location((3.878926005, -21.462549215, 0), (0, 0, 90))):
            Circle(ESBO_O6_R)
    extrude(amount=CORTE_EXTRUS_O10_DEPTH + CORTE_EXTRUS_O10_DEPTH_BACK, mode=Mode.SUBTRACT)


solid = part.part
